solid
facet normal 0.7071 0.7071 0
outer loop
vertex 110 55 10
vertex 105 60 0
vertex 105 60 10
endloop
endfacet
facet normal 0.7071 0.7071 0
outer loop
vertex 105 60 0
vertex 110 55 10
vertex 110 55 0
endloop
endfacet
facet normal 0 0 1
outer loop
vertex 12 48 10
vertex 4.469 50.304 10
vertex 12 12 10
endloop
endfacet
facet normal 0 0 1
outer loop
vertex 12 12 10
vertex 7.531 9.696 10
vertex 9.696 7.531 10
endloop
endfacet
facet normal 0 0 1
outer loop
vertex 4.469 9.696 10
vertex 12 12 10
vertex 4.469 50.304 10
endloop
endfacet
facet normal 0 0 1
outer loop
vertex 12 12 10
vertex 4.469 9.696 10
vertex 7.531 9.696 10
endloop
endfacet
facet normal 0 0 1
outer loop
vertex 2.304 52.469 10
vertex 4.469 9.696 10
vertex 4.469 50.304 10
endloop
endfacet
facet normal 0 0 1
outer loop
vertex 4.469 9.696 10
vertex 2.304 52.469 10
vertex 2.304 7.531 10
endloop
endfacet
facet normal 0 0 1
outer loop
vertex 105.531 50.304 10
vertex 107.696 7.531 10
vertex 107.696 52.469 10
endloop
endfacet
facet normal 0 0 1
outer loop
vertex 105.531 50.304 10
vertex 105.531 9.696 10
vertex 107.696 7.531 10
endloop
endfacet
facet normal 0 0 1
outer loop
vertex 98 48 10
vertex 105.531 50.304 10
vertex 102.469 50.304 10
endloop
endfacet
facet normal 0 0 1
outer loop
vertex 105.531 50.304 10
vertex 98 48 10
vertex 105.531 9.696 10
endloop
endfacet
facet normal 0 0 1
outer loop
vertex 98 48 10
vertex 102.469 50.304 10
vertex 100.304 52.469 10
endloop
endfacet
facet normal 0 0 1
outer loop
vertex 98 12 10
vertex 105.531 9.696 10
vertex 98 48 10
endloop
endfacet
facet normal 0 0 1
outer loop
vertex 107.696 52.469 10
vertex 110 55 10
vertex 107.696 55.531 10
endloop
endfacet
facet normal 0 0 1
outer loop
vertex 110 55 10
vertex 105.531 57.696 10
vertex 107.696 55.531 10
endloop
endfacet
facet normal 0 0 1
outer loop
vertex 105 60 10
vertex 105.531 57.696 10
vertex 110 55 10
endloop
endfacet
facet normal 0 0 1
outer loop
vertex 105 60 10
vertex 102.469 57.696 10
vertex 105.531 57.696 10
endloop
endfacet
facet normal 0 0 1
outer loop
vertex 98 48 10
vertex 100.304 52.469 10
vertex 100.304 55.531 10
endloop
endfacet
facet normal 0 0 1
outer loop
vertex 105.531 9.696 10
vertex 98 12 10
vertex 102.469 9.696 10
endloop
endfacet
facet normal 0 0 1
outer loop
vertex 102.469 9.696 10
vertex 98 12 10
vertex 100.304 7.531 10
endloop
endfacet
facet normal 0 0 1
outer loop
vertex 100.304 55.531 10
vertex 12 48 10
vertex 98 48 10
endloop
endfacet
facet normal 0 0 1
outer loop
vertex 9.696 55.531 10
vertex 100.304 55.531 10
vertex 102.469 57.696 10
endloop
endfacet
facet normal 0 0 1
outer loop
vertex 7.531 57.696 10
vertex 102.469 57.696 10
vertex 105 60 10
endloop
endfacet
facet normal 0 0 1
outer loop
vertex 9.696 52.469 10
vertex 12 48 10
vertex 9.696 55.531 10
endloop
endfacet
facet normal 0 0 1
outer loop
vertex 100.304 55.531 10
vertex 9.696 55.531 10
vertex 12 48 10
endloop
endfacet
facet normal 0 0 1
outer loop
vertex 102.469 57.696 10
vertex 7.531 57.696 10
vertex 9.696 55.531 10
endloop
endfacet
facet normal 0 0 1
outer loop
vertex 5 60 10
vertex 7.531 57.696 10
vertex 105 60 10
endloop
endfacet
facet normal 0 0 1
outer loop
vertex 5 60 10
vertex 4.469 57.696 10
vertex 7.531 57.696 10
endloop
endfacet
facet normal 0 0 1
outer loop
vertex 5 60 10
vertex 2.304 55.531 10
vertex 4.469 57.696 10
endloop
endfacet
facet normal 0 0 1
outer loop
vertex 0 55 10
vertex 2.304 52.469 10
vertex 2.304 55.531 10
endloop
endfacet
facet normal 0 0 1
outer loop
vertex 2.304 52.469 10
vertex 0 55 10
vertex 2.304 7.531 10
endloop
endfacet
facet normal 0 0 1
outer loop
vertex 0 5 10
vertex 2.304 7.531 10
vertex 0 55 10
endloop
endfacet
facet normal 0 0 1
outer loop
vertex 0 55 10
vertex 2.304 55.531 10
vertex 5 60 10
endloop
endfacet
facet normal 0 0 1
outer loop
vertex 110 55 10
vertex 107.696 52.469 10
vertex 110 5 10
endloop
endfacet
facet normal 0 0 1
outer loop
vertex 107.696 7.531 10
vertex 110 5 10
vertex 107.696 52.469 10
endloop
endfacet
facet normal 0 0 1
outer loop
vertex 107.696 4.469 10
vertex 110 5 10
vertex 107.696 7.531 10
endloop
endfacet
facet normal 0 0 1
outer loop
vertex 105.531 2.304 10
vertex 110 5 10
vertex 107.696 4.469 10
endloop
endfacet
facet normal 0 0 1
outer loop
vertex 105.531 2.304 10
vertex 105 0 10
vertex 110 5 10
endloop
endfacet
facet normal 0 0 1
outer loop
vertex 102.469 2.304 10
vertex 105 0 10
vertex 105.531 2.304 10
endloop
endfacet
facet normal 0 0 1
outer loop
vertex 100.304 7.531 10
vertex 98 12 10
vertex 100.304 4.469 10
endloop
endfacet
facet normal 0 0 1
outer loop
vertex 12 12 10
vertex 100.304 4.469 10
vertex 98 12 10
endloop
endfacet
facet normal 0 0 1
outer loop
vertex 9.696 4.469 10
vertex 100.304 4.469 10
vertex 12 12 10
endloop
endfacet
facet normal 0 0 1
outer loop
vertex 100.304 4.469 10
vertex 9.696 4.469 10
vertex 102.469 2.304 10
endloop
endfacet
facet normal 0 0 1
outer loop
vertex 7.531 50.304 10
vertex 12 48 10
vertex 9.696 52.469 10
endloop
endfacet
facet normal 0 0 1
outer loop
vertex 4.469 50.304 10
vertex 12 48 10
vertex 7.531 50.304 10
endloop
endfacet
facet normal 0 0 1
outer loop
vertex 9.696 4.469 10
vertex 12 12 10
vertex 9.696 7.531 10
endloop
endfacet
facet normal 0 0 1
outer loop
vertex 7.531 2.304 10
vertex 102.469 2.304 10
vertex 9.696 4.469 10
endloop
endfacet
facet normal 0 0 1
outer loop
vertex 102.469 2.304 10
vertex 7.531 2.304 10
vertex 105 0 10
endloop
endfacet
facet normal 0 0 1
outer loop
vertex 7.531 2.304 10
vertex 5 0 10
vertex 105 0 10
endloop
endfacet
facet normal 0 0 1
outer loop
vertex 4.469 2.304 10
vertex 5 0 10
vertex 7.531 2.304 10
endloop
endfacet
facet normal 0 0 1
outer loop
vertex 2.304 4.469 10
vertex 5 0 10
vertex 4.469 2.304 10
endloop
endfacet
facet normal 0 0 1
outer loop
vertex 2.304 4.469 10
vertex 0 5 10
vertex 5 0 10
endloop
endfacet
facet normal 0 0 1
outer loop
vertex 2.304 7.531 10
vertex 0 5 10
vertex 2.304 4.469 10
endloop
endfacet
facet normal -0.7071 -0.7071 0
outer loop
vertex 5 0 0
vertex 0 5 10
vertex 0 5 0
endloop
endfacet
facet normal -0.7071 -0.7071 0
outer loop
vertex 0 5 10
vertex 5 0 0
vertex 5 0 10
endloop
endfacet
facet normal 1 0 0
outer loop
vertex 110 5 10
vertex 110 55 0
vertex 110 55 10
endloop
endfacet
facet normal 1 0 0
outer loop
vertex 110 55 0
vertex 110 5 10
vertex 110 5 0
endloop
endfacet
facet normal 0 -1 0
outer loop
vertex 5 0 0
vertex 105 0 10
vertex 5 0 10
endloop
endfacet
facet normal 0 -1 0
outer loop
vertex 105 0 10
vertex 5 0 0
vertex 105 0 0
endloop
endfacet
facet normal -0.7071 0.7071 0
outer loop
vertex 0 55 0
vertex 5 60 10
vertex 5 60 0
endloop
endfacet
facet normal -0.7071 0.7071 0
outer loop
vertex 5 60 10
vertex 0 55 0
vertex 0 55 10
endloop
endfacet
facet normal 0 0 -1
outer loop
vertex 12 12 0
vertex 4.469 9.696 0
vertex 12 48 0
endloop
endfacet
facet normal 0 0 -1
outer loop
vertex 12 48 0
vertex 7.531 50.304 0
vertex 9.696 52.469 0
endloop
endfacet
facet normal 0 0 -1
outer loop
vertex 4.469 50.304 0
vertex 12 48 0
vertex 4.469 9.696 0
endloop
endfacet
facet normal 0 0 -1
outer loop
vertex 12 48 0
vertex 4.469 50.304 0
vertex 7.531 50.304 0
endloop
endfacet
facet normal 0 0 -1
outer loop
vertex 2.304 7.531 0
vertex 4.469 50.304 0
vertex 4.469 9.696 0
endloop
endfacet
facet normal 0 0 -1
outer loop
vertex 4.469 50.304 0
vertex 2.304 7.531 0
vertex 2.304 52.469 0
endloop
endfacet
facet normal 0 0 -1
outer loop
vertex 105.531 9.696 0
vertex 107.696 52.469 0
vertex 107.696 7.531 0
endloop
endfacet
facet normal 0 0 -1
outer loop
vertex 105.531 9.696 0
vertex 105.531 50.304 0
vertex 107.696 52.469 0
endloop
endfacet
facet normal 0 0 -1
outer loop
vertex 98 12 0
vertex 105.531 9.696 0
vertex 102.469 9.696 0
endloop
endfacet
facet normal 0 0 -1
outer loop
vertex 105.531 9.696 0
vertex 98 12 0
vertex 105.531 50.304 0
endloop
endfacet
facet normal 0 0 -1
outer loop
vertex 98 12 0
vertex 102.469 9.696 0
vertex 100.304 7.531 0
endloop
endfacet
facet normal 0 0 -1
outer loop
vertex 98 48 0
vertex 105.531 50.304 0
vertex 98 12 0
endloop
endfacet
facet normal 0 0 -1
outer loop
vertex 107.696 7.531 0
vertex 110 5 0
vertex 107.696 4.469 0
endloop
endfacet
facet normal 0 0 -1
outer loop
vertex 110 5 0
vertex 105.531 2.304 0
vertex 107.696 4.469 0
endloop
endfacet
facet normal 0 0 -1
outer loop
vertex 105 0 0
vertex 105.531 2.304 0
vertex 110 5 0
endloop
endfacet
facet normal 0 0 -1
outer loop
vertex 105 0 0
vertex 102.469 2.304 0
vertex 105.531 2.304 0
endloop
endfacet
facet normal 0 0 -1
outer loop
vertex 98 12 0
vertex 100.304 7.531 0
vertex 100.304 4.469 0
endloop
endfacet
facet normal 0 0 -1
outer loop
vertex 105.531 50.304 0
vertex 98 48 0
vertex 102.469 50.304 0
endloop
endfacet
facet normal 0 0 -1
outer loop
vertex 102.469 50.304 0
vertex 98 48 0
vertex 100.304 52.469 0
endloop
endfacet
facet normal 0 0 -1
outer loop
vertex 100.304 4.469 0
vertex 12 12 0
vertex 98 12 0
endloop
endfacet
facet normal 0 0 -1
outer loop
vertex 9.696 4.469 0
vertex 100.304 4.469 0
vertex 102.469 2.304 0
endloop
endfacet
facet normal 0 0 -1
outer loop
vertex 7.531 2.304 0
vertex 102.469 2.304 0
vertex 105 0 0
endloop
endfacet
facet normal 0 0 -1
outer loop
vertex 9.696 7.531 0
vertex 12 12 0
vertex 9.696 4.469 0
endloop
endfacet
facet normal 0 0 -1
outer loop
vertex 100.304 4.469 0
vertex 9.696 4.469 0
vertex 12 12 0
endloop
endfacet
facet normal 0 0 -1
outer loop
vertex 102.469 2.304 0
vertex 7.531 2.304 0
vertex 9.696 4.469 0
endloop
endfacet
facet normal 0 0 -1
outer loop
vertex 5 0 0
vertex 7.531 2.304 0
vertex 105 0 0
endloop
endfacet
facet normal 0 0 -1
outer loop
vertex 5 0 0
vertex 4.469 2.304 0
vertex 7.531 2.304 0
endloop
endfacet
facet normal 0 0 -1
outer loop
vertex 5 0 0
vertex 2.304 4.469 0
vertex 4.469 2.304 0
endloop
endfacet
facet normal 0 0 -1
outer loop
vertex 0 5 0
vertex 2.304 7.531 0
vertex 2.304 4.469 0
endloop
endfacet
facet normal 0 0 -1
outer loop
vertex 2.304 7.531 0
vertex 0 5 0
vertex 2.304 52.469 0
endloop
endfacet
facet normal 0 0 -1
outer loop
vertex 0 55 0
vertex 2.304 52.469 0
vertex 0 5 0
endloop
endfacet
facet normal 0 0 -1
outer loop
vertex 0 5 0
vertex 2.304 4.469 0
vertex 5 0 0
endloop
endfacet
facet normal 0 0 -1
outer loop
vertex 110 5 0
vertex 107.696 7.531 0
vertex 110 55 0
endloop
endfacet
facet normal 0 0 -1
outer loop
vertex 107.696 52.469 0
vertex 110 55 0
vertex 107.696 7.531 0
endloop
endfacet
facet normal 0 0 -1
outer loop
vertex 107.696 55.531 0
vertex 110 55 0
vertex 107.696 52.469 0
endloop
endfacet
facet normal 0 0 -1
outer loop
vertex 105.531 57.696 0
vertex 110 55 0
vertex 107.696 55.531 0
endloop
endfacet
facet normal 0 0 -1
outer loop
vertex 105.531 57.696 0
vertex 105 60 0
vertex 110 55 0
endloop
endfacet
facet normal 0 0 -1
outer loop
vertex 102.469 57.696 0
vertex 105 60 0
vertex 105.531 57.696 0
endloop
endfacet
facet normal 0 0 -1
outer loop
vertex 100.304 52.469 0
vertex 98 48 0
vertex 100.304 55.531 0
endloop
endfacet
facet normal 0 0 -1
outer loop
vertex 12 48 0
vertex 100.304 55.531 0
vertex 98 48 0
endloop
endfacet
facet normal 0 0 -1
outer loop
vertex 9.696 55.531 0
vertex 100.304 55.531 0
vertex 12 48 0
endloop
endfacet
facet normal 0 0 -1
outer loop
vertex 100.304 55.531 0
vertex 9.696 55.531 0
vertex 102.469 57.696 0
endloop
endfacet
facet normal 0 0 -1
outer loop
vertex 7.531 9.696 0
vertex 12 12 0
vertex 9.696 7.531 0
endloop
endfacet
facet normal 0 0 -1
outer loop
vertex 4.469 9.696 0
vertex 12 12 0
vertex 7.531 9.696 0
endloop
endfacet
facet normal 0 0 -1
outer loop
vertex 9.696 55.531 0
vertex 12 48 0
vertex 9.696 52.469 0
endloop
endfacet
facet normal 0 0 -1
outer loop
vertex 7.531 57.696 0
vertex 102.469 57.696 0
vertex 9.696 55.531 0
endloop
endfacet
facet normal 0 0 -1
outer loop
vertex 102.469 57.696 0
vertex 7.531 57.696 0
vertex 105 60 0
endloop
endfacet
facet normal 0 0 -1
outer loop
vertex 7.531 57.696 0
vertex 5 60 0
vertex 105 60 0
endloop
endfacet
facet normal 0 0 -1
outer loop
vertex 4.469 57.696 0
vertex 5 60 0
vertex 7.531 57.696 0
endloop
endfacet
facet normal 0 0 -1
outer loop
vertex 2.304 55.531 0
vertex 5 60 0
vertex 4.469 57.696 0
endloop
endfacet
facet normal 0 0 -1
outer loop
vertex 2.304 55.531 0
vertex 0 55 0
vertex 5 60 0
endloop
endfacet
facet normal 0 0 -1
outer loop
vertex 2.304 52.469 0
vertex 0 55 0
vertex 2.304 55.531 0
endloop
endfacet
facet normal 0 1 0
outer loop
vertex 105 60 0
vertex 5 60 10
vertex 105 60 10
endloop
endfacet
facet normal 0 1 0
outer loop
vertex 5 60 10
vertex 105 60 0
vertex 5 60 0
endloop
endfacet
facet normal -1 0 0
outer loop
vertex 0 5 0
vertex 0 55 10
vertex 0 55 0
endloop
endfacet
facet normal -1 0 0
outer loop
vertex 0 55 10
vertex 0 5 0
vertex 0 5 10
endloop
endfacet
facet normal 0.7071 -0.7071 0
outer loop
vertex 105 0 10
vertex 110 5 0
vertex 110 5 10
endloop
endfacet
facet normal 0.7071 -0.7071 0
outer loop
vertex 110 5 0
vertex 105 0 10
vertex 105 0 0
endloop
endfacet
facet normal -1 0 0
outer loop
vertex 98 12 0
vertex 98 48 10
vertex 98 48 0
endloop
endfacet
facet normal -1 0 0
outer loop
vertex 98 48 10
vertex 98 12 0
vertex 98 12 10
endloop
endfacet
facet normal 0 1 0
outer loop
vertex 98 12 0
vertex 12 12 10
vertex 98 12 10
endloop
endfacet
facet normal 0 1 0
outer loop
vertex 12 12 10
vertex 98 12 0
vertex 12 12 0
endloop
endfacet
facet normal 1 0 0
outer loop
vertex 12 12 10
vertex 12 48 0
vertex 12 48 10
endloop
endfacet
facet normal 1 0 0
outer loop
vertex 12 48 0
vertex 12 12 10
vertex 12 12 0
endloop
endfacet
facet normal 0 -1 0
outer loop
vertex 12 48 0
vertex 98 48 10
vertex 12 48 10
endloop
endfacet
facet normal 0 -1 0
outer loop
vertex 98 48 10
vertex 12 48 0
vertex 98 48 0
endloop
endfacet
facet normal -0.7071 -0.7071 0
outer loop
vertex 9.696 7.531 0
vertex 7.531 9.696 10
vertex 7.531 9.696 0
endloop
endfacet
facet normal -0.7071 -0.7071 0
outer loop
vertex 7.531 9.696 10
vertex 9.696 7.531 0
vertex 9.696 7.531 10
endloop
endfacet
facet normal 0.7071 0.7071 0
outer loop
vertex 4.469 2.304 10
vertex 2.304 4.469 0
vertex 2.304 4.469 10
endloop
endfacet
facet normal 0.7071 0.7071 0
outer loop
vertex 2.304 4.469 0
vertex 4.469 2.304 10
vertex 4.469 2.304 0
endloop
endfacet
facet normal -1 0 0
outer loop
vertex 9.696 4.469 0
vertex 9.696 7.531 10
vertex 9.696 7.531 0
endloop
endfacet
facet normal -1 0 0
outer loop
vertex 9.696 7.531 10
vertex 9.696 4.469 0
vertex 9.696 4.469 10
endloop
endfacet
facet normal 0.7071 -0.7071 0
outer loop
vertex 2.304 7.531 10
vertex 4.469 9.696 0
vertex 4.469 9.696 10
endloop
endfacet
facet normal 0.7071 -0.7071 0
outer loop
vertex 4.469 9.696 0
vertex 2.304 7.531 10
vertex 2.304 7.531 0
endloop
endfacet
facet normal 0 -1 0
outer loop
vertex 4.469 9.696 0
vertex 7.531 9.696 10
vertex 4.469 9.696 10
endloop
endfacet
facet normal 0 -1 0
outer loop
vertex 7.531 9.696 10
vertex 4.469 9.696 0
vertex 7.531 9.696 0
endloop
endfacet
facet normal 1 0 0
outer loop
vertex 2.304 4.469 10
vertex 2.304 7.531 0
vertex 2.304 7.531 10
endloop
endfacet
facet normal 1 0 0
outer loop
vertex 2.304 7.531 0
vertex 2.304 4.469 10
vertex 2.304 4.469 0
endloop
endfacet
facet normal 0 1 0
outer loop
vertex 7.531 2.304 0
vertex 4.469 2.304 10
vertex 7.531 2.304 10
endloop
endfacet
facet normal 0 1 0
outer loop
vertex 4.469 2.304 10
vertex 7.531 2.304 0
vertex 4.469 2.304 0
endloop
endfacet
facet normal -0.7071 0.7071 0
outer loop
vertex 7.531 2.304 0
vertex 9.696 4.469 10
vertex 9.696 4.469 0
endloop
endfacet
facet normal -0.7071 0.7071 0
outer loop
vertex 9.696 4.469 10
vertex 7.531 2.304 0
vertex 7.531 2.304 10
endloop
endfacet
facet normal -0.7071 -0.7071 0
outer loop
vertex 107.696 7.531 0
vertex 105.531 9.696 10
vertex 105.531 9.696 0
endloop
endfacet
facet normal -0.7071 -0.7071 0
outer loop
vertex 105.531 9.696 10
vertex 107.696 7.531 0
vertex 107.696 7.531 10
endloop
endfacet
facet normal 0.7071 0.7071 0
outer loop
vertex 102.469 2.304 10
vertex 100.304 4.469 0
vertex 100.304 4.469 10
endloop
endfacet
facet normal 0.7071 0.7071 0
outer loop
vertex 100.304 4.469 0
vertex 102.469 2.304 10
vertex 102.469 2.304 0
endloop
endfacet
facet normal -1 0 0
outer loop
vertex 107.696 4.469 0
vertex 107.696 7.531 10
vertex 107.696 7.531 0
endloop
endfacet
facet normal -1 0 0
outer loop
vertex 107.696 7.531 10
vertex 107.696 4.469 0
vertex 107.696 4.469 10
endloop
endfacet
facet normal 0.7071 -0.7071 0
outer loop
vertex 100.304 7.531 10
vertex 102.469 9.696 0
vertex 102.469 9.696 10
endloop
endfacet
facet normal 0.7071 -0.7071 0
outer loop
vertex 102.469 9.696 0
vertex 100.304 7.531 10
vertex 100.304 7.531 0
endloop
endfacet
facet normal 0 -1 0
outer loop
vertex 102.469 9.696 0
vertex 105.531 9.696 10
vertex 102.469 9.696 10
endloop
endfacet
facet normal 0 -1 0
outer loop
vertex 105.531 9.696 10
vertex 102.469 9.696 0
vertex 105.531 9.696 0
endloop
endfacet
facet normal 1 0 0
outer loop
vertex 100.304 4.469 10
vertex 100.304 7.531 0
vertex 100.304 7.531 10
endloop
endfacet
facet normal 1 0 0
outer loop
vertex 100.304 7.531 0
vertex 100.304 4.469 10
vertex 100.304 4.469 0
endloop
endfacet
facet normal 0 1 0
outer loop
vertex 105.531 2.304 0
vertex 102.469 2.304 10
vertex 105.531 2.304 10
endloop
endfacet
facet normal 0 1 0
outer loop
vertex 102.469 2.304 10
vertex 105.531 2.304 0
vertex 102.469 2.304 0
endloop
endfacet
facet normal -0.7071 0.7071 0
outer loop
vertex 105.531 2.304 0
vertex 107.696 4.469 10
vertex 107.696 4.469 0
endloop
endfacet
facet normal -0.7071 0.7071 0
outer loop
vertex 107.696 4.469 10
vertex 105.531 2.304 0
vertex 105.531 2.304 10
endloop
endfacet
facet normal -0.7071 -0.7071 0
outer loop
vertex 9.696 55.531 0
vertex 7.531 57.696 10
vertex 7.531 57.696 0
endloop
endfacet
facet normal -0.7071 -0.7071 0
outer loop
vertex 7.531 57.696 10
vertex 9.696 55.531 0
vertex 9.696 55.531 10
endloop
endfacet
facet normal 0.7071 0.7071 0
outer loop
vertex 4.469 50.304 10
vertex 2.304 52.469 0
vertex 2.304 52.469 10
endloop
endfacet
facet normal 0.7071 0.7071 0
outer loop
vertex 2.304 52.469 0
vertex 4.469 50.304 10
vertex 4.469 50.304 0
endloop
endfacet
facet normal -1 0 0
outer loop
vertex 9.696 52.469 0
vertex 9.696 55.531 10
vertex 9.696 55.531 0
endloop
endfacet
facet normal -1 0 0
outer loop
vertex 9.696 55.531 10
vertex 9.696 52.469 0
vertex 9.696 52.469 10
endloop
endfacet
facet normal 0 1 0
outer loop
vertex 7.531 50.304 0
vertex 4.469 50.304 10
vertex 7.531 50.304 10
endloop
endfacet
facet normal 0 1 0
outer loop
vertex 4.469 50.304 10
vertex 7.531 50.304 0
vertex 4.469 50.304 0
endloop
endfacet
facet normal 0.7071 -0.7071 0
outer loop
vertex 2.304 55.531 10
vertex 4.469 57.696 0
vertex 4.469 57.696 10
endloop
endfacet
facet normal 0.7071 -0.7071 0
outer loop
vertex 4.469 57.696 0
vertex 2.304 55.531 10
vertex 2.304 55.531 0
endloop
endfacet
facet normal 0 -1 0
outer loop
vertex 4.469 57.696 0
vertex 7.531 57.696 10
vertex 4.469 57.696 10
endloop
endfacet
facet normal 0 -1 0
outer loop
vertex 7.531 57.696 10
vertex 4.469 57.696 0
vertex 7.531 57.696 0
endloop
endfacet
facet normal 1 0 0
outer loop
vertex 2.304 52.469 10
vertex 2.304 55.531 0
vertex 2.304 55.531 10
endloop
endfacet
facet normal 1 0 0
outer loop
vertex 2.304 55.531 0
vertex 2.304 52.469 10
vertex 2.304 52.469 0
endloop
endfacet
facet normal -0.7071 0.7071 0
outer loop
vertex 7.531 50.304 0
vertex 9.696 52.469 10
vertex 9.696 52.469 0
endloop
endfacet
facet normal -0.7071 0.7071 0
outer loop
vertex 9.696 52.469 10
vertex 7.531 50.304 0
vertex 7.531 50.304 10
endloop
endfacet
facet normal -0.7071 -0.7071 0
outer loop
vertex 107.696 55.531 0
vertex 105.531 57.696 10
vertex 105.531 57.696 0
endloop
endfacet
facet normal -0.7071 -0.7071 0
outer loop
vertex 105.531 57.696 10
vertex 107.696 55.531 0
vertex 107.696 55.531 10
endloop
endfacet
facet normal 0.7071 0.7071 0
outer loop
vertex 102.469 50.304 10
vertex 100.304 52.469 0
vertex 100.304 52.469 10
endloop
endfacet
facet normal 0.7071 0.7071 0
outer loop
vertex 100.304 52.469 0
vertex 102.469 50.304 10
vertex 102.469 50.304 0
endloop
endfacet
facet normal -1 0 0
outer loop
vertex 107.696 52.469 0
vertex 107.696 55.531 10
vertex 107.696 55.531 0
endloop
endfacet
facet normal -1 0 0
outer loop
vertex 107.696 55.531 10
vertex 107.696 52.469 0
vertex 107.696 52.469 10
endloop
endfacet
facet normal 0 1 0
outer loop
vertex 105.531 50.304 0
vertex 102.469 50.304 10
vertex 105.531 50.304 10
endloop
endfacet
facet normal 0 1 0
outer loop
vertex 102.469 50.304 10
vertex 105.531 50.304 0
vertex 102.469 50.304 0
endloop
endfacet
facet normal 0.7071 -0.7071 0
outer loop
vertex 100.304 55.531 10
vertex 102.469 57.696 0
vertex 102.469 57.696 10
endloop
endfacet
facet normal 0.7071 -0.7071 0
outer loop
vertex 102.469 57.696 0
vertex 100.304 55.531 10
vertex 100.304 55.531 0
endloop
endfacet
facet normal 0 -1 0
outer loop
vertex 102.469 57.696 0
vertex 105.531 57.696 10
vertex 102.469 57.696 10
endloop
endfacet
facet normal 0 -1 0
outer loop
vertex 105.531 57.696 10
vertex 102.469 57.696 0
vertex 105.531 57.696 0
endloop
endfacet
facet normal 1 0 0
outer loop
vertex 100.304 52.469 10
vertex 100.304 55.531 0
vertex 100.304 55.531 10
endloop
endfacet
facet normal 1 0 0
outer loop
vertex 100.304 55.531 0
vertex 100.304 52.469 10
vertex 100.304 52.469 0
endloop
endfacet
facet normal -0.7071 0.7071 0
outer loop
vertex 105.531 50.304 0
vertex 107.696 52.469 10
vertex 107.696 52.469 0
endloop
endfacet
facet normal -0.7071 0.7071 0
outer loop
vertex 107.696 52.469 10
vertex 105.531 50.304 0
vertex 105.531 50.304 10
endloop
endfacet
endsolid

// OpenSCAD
$fn = 32;

// ----------------------------------------------------------------------
// Frame plate: 110 x 60 frame, 12 mm rails
// ----------------------------------------------------------------------

// --- parameters (mm) ---
plate_l = 110;            // plate length, X
plate_w = 60;             // plate width, Y
plate_t = 10;             // plate thickness, Z (extrusion height)
corner_c = 5;             // corner chamfer
frame_bar = 12;           // frame rail width
bolt_r = 4;               // corner bolt window radius
bolt_inset = 6;           // bolt centre inset from the edges

win_l = plate_l - 2 * frame_bar;  // window length
win_w = plate_w - 2 * frame_bar;  // window width
bolt_d = 2 * bolt_r;  // corner hole diameter

profile = [[5, 0], [105, 0], [110, 5], [110, 55], [105, 60], [5, 60], [0, 55], [0, 5]];  // primary outline, 8 points, counter clockwise
void_1 = [[12, 12], [98, 12], [98, 48], [12, 48]];  // the window, 4 points
void_2 = [[9.696, 7.531], [7.531, 9.696], [4.469, 9.696], [2.304, 7.531], [2.304, 4.469], [4.469, 2.304], [7.531, 2.304], [9.696, 4.469]];  // corner bolt window, 8 points
void_3 = [[107.696, 7.531], [105.531, 9.696], [102.469, 9.696], [100.304, 7.531], [100.304, 4.469], [102.469, 2.304], [105.531, 2.304], [107.696, 4.469]];  // corner bolt window, 8 points
void_4 = [[9.696, 55.531], [7.531, 57.696], [4.469, 57.696], [2.304, 55.531], [2.304, 52.469], [4.469, 50.304], [7.531, 50.304], [9.696, 52.469]];  // corner bolt window, 8 points
void_5 = [[107.696, 55.531], [105.531, 57.696], [102.469, 57.696], [100.304, 55.531], [100.304, 52.469], [102.469, 50.304], [105.531, 50.304], [107.696, 52.469]];  // corner bolt window, 8 points

// --- the one profile operation ---
difference() {
  linear_extrude(height = plate_t) polygon(points = profile);
  translate([0, 0, -1])
    linear_extrude(height = plate_t + 2) polygon(points = void_1);
  translate([0, 0, -1])
    linear_extrude(height = plate_t + 2) polygon(points = void_2);
  translate([0, 0, -1])
    linear_extrude(height = plate_t + 2) polygon(points = void_3);
  translate([0, 0, -1])
    linear_extrude(height = plate_t + 2) polygon(points = void_4);
  translate([0, 0, -1])
    linear_extrude(height = plate_t + 2) polygon(points = void_5);
}
